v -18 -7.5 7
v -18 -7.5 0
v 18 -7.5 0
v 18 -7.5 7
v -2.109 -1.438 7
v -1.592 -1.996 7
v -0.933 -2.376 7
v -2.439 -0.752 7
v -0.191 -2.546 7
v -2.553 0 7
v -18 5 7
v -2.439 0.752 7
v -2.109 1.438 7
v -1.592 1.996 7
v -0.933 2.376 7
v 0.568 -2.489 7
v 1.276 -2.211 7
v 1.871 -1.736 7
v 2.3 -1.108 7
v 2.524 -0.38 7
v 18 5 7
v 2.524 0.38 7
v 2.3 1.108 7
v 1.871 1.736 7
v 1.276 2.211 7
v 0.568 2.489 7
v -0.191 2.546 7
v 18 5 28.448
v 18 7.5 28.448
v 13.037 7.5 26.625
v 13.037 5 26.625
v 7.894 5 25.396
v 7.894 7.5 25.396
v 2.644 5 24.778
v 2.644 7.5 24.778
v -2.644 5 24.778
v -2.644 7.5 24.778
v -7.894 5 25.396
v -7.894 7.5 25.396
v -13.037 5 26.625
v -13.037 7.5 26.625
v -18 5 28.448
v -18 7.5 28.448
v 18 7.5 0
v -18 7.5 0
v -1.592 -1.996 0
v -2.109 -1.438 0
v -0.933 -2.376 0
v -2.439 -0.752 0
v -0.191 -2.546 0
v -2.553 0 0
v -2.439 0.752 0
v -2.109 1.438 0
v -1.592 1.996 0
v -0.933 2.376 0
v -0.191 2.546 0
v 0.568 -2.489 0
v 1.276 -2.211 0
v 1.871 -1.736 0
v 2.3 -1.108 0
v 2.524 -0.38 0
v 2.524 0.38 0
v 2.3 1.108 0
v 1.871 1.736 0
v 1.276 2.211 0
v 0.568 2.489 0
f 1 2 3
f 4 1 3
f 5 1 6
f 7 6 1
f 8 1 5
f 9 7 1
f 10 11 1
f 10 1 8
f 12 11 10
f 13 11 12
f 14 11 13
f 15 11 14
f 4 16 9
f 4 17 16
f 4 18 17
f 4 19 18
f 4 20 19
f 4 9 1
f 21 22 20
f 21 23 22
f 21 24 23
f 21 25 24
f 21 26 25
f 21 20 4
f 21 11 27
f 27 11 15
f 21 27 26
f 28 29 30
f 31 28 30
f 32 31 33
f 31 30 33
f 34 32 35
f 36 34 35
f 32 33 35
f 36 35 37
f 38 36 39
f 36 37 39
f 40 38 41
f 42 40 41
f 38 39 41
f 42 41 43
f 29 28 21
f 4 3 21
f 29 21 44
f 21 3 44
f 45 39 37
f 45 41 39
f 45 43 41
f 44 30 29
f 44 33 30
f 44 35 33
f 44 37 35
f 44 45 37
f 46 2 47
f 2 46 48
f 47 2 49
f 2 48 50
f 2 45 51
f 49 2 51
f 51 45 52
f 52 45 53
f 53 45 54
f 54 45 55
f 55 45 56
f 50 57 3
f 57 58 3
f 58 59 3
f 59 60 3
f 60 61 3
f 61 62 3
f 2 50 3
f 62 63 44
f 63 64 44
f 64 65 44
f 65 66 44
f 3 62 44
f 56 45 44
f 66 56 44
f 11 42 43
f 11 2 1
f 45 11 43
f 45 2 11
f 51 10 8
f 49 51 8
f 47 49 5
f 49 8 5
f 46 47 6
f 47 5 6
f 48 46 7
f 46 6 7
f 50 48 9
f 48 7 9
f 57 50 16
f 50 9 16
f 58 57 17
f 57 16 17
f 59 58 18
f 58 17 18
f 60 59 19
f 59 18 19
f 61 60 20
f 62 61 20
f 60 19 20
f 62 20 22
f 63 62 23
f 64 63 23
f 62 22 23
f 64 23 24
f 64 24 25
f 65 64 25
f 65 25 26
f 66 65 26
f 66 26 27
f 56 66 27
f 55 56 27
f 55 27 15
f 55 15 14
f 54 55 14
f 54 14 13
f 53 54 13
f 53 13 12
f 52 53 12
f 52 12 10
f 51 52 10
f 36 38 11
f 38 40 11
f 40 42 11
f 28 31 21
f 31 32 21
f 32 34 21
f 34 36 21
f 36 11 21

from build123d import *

# Parameters (mm, degrees)
F0_W       = 36
F0_H       = 15
F1_DEPTH   = 7
F2_W       = 36
F2_H       = 2.5
F3_DEPTH   = 30
F3_FACE1_W = 36
F3_FACE1_H = 30
F5_DEPTH   = 25
F6_D       = 5.1054


with BuildPart() as f1:
    # F0 (on Top) → F1 (new body)
    with BuildSketch(Plane.XY):
        Rectangle(F0_W, F0_H)
    extrude(amount=F1_DEPTH)

    # F2 (on face) → F3 (join)
    with BuildSketch(Plane.XY.offset(7)):
        with Locations((0, 6.25)):
            Rectangle(F2_W, F2_H)
    extrude(amount=F3_DEPTH)

    # F4 (on face) + F3_face1 (on face) → F5 (cut)
    with BuildSketch(Plane(origin=(0, 7.5, 0), x_dir=(-1, 0, 0), z_dir=(0, 1, 0))):
        with BuildLine():
            Line((-18, 37), (-18, 28.4477328312))
            ThreePointArc((-18, 28.4477328312), (0, 24.7), (18, 28.4477328312))
            Line((18, 28.4477328312), (18, 37))
            Line((18, 37), (-18, 37))
        make_face()
    with BuildSketch(Plane(origin=(0, 5, 22), x_dir=(1, 0, 0), z_dir=(0, -1, 0))):
        Rectangle(F3_FACE1_W, F3_FACE1_H)
    extrude(amount=-F5_DEPTH, dir=(0, 1, 0), mode=Mode.SUBTRACT)

    # F6 (through all)
    with Locations(Plane(origin=(0, 0, 0), x_dir=(1, 0, 0), z_dir=(0, 0, -1))):
        with Locations((0, 0)):
            Hole(F6_D / 2)


solid = f1.part
